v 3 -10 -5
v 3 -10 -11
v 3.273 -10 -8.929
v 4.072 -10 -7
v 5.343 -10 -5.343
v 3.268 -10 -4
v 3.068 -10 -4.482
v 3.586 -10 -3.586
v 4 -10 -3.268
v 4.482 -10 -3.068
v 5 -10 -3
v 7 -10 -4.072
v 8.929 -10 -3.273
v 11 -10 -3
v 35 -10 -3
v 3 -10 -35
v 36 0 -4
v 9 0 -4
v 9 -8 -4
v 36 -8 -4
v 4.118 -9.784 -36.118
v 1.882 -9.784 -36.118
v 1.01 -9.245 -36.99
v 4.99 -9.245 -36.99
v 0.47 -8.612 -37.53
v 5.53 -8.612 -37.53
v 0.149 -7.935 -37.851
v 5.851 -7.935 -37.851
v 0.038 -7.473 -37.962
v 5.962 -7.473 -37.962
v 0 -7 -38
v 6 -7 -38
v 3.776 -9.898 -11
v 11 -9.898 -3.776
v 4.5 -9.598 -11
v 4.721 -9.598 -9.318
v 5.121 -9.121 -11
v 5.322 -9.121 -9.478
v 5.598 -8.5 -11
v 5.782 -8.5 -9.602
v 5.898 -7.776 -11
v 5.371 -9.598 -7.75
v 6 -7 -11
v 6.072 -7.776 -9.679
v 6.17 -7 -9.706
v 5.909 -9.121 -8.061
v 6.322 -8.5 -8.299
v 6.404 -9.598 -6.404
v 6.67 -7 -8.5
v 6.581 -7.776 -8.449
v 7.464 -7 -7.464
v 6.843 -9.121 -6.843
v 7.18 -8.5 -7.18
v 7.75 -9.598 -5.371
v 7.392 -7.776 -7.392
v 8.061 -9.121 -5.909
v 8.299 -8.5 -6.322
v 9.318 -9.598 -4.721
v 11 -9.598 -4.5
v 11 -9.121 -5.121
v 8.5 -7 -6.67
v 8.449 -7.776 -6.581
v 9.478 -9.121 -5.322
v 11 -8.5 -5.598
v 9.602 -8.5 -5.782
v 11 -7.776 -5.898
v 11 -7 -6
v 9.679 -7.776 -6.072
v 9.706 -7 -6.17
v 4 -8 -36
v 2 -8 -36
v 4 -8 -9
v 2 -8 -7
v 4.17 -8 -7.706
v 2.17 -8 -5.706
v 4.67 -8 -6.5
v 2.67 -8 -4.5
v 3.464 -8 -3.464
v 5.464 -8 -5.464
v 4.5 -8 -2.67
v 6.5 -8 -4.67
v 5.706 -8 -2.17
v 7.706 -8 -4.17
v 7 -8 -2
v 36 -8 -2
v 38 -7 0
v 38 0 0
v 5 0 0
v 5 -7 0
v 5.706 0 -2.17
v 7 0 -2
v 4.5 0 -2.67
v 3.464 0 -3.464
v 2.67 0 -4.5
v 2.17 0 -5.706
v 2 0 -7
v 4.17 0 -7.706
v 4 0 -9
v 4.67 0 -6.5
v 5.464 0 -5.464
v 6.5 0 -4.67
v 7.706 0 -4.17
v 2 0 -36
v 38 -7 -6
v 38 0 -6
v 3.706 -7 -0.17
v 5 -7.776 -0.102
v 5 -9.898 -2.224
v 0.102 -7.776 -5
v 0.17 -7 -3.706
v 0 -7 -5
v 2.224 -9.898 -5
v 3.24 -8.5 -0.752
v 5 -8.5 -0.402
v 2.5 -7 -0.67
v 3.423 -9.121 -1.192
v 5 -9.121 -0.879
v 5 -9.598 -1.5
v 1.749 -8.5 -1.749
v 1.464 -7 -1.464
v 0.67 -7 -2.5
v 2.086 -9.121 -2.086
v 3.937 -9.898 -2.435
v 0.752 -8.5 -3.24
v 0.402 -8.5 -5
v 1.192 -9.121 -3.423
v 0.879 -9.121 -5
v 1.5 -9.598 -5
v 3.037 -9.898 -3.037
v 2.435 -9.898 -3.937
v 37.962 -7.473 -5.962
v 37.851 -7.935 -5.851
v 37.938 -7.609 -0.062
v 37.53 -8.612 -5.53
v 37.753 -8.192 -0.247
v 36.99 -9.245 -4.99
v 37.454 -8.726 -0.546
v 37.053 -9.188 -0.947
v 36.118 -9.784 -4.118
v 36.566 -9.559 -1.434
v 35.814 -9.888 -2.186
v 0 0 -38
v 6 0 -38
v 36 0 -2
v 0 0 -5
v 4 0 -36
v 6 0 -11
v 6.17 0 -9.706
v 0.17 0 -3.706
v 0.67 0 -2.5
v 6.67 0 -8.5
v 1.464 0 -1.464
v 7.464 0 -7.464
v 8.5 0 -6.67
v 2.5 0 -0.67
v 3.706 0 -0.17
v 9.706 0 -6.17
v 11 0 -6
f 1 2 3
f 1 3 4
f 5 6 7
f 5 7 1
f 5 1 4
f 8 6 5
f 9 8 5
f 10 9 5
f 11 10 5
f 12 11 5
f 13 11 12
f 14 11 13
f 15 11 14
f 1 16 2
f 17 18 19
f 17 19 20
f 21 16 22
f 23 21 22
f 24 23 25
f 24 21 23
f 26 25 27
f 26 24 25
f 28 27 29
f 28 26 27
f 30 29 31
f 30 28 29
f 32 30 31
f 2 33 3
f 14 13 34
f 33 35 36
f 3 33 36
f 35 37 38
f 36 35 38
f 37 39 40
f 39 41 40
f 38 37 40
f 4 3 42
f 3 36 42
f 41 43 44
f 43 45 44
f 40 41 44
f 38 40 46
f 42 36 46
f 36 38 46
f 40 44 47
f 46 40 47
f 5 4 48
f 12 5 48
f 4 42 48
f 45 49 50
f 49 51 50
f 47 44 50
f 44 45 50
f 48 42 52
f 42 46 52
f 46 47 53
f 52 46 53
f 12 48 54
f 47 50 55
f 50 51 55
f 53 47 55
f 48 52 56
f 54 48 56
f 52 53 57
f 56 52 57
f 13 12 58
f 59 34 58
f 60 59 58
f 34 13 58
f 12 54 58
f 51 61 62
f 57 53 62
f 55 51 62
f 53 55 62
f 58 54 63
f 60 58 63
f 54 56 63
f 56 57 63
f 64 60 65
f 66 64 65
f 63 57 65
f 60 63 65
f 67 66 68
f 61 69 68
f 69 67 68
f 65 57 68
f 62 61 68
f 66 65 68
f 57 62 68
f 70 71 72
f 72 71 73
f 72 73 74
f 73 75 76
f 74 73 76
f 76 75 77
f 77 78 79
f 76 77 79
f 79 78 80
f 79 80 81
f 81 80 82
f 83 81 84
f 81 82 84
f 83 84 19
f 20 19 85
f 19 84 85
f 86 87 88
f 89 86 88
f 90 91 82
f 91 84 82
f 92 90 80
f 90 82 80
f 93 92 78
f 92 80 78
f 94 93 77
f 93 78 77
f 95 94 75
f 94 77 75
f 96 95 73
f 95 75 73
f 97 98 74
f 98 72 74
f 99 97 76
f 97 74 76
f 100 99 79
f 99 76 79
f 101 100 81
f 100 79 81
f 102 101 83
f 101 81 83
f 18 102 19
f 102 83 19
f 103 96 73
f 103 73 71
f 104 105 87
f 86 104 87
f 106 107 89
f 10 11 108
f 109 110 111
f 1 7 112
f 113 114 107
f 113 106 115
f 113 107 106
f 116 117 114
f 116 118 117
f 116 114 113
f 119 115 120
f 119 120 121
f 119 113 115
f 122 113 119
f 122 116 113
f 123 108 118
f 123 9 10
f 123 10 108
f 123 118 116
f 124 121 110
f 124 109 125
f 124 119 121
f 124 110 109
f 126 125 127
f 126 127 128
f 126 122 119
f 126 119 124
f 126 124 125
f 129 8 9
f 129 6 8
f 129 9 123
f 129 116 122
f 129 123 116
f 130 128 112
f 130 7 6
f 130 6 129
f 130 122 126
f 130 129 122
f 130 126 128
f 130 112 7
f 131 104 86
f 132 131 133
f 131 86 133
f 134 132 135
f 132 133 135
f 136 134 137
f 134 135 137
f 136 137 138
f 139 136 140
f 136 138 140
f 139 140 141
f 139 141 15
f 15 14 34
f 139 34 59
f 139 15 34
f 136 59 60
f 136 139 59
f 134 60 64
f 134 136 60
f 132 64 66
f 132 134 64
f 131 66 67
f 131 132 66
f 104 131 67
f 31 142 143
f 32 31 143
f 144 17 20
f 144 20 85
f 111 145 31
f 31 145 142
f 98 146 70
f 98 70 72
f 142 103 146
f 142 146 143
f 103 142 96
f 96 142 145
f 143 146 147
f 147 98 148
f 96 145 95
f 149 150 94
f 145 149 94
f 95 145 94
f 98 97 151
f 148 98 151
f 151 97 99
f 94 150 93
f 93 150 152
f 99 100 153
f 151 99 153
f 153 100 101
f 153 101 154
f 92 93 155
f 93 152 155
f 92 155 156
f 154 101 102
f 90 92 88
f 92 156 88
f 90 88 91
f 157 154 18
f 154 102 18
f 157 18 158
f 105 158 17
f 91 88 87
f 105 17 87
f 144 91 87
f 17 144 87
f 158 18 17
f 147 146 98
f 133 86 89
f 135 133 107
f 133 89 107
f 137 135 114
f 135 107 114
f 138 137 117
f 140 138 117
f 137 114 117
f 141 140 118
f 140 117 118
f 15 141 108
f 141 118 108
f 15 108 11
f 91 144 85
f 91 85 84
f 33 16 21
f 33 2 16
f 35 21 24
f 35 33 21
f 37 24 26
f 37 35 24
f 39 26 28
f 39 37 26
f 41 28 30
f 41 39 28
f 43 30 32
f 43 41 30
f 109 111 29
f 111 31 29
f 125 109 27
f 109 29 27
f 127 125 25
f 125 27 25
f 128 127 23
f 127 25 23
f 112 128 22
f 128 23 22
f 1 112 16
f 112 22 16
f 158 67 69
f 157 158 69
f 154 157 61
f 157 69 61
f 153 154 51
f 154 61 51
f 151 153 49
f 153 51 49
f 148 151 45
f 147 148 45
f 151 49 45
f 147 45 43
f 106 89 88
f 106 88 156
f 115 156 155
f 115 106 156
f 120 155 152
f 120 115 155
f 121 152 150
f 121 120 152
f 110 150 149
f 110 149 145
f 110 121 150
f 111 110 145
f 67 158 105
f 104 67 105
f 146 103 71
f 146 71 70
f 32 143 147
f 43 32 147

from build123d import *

# Parameters (mm, degrees)
F1_DEPTH      = 10
F3_DEPTH      = 10
F3_DEPTH_BACK = 8
F4_R          = 5
F5_R          = 2.99999


# Not quite as in the source:
# - a fillet or chamfer is up to 0.001 mm smaller than in the source, because OpenCascade refuses the exact size


with BuildPart() as f1:
    # F0 (on Front) → F1 (new body)
    with BuildSketch(Plane.XZ):
        Polygon((38, 0), (0, 0), (0, -38), (6, -38), (6, -6), (38, -6), align=None)
    extrude(amount=F1_DEPTH)

    # F2 (on Front) → F3 (cut, two sides)
    with BuildSketch(Plane.XZ) as f3_sk:
        Polygon((36, -2), (2, -2), (2, -36), (4, -36), (4, -4), (36, -4), align=None)
    extrude(amount=-F3_DEPTH, mode=Mode.SUBTRACT)
    extrude(f3_sk.sketch, amount=F3_DEPTH_BACK, mode=Mode.SUBTRACT)

    # F4
    f4_edges = [f1.edges().sort_by_distance(p)[0] for p in [
        (0, -5, 0),
        (4, -4, -4),
        (2, -4, -2),
        (6, -5, -6),
    ]]
    fillet(f4_edges, radius=F4_R)

    # F5 (radius 3 in the source; OpenCascade refuses exactly that, so slightly less here)
    f5_edges = [f1.edges().sort_by_distance(p)[0] for p in [
        (3, -10, -38),
        (6, -10, -24.5),
        (21.5, -10, 0),
        (38, -10, -3),
    ]]
    fillet(f5_edges, radius=F5_R)


solid = f1.part
